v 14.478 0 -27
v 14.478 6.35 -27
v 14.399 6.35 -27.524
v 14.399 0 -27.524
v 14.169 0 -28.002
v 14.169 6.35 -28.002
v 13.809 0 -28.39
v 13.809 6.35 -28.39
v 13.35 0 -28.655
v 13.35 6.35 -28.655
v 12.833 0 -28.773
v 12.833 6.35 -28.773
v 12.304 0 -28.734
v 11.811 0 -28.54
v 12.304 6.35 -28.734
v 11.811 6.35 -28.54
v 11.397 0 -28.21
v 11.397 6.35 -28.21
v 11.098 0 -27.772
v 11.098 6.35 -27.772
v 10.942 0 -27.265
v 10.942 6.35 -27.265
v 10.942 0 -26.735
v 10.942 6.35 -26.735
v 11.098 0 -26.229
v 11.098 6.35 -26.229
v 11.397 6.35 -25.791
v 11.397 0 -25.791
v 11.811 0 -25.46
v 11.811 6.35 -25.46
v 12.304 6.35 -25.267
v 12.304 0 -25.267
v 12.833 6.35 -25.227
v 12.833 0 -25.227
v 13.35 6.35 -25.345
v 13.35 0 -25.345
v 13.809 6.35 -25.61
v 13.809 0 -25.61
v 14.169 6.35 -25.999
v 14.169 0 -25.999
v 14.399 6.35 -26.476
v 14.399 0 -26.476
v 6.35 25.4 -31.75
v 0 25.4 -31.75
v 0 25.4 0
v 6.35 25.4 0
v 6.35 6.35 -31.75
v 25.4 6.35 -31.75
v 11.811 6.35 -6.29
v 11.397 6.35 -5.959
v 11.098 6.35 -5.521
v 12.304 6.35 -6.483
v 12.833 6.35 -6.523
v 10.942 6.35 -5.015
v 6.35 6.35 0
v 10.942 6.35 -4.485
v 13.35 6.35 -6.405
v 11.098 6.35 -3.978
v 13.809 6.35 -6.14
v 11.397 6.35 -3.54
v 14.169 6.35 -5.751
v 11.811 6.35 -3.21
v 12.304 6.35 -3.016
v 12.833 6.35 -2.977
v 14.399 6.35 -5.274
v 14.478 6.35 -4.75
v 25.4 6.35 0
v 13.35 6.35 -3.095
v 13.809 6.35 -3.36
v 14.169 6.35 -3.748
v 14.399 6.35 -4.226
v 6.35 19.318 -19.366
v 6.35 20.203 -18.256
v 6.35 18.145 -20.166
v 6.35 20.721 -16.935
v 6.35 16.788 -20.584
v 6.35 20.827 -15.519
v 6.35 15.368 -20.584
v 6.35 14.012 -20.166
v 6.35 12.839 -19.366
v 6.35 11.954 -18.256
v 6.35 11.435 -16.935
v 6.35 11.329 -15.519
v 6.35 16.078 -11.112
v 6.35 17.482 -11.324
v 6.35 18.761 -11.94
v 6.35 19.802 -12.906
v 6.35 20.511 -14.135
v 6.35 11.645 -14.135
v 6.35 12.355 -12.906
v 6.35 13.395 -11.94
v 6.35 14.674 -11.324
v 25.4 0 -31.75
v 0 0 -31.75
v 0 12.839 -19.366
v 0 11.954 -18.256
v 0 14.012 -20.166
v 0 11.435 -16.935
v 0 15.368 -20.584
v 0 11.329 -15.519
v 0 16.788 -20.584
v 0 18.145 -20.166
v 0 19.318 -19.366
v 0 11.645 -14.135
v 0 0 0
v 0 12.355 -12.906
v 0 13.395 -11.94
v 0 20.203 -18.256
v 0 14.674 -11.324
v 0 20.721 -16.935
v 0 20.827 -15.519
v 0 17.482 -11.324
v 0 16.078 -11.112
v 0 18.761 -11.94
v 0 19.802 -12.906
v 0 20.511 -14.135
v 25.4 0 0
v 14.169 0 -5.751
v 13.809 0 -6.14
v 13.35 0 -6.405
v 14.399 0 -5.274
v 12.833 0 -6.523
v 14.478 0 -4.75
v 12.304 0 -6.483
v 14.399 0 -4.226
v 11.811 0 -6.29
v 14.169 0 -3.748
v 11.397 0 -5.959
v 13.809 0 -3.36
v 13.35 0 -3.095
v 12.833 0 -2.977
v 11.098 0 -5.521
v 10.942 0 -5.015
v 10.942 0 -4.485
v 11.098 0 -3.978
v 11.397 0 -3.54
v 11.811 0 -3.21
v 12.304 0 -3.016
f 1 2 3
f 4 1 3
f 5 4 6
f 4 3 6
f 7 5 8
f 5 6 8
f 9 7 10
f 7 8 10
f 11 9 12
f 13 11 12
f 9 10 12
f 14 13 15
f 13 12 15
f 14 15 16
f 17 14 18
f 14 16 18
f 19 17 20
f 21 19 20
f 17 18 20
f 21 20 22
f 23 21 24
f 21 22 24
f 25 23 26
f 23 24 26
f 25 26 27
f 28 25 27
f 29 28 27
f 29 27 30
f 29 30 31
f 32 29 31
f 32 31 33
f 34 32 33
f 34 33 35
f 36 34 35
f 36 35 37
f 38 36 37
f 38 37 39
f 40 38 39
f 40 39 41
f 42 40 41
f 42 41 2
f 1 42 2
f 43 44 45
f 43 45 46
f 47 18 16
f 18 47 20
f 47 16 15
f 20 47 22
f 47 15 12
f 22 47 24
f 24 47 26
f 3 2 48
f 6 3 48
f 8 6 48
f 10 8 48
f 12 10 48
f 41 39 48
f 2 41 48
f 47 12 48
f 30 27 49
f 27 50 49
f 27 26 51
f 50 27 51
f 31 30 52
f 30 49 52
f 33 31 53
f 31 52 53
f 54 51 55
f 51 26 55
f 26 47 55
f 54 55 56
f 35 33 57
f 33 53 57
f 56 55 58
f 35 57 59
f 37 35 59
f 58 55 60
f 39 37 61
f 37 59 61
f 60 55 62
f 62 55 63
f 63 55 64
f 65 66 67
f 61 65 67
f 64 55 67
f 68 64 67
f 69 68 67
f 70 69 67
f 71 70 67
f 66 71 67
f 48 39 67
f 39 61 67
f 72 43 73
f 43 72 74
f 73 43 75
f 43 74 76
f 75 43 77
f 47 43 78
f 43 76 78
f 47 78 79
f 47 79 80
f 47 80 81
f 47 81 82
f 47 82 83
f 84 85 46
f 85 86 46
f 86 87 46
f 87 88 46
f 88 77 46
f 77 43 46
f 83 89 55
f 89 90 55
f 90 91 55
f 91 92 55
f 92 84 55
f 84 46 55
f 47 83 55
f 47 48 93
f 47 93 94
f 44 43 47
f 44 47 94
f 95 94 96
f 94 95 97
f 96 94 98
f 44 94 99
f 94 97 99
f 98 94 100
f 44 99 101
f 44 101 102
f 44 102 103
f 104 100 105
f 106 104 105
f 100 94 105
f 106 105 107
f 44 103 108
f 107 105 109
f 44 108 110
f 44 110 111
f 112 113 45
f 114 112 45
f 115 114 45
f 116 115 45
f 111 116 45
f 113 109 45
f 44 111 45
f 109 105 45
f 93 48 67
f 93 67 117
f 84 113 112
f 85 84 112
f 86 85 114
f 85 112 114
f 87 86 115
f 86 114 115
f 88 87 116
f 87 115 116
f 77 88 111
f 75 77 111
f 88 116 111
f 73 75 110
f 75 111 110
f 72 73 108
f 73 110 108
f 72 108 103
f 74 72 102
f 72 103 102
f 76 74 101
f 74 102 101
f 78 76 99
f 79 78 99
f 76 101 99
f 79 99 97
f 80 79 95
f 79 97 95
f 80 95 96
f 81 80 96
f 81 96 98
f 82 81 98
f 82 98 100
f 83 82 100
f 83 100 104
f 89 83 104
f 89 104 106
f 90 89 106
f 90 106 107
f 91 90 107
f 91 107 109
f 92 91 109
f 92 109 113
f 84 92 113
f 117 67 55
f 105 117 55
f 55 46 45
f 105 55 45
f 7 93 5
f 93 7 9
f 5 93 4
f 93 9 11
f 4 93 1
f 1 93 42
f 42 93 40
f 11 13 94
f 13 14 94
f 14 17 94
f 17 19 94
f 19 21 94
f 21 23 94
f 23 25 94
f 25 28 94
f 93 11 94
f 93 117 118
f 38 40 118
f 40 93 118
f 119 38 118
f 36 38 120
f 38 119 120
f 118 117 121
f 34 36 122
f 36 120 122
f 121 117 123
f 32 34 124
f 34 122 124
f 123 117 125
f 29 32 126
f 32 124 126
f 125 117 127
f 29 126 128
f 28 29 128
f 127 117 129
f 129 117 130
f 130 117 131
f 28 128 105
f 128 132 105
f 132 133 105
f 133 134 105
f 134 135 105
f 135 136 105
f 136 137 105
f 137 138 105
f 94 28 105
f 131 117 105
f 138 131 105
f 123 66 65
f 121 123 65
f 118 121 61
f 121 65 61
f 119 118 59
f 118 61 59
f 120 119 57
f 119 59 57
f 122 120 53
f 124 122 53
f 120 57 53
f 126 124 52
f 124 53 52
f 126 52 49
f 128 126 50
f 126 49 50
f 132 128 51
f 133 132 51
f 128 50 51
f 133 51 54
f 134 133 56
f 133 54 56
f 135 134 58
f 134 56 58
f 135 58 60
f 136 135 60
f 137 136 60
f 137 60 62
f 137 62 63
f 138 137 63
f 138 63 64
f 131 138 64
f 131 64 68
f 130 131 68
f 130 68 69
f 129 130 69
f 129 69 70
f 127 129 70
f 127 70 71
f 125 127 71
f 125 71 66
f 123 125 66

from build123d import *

# Parameters (mm, degrees)
BOSS_EXTRUDE1_DEPTH = 31.75
SKETCH2_R           = 4.7625
CUT_EXTRUDE1_DEPTH  = 26.4
SKETCH3_R           = 1.778
CUT_EXTRUDE2_DEPTH  = 7.35


with BuildPart() as part:
    # Sketch1 → Boss-Extrude1 (new body)
    with BuildSketch(Plane.XY):
        Polygon((0, 0), (0, 25.4), (6.35, 25.4), (6.35, 6.35), (25.4, 6.35), (25.4, 0), align=None)
    extrude(amount=-BOSS_EXTRUDE1_DEPTH)

    # Sketch2 → Cut-Extrude1 (cut, through all)
    with BuildSketch(Plane.ZY):
        with Locations((-15.875, 16.0782)):
            Circle(SKETCH2_R)
    extrude(amount=-CUT_EXTRUDE1_DEPTH, mode=Mode.SUBTRACT)

    # Sketch3 → Cut-Extrude2 (cut, through all)
    with BuildSketch(Plane(origin=(0, 6.35, 0), x_dir=(1, 0, 0), z_dir=(0, 1, 0))):
        with Locations((12.7, 27.0002)):
            Circle(SKETCH3_R)
        with Locations((12.7, 4.7498)):
            Circle(SKETCH3_R)
    extrude(amount=-CUT_EXTRUDE2_DEPTH, mode=Mode.SUBTRACT)


solid = part.part
